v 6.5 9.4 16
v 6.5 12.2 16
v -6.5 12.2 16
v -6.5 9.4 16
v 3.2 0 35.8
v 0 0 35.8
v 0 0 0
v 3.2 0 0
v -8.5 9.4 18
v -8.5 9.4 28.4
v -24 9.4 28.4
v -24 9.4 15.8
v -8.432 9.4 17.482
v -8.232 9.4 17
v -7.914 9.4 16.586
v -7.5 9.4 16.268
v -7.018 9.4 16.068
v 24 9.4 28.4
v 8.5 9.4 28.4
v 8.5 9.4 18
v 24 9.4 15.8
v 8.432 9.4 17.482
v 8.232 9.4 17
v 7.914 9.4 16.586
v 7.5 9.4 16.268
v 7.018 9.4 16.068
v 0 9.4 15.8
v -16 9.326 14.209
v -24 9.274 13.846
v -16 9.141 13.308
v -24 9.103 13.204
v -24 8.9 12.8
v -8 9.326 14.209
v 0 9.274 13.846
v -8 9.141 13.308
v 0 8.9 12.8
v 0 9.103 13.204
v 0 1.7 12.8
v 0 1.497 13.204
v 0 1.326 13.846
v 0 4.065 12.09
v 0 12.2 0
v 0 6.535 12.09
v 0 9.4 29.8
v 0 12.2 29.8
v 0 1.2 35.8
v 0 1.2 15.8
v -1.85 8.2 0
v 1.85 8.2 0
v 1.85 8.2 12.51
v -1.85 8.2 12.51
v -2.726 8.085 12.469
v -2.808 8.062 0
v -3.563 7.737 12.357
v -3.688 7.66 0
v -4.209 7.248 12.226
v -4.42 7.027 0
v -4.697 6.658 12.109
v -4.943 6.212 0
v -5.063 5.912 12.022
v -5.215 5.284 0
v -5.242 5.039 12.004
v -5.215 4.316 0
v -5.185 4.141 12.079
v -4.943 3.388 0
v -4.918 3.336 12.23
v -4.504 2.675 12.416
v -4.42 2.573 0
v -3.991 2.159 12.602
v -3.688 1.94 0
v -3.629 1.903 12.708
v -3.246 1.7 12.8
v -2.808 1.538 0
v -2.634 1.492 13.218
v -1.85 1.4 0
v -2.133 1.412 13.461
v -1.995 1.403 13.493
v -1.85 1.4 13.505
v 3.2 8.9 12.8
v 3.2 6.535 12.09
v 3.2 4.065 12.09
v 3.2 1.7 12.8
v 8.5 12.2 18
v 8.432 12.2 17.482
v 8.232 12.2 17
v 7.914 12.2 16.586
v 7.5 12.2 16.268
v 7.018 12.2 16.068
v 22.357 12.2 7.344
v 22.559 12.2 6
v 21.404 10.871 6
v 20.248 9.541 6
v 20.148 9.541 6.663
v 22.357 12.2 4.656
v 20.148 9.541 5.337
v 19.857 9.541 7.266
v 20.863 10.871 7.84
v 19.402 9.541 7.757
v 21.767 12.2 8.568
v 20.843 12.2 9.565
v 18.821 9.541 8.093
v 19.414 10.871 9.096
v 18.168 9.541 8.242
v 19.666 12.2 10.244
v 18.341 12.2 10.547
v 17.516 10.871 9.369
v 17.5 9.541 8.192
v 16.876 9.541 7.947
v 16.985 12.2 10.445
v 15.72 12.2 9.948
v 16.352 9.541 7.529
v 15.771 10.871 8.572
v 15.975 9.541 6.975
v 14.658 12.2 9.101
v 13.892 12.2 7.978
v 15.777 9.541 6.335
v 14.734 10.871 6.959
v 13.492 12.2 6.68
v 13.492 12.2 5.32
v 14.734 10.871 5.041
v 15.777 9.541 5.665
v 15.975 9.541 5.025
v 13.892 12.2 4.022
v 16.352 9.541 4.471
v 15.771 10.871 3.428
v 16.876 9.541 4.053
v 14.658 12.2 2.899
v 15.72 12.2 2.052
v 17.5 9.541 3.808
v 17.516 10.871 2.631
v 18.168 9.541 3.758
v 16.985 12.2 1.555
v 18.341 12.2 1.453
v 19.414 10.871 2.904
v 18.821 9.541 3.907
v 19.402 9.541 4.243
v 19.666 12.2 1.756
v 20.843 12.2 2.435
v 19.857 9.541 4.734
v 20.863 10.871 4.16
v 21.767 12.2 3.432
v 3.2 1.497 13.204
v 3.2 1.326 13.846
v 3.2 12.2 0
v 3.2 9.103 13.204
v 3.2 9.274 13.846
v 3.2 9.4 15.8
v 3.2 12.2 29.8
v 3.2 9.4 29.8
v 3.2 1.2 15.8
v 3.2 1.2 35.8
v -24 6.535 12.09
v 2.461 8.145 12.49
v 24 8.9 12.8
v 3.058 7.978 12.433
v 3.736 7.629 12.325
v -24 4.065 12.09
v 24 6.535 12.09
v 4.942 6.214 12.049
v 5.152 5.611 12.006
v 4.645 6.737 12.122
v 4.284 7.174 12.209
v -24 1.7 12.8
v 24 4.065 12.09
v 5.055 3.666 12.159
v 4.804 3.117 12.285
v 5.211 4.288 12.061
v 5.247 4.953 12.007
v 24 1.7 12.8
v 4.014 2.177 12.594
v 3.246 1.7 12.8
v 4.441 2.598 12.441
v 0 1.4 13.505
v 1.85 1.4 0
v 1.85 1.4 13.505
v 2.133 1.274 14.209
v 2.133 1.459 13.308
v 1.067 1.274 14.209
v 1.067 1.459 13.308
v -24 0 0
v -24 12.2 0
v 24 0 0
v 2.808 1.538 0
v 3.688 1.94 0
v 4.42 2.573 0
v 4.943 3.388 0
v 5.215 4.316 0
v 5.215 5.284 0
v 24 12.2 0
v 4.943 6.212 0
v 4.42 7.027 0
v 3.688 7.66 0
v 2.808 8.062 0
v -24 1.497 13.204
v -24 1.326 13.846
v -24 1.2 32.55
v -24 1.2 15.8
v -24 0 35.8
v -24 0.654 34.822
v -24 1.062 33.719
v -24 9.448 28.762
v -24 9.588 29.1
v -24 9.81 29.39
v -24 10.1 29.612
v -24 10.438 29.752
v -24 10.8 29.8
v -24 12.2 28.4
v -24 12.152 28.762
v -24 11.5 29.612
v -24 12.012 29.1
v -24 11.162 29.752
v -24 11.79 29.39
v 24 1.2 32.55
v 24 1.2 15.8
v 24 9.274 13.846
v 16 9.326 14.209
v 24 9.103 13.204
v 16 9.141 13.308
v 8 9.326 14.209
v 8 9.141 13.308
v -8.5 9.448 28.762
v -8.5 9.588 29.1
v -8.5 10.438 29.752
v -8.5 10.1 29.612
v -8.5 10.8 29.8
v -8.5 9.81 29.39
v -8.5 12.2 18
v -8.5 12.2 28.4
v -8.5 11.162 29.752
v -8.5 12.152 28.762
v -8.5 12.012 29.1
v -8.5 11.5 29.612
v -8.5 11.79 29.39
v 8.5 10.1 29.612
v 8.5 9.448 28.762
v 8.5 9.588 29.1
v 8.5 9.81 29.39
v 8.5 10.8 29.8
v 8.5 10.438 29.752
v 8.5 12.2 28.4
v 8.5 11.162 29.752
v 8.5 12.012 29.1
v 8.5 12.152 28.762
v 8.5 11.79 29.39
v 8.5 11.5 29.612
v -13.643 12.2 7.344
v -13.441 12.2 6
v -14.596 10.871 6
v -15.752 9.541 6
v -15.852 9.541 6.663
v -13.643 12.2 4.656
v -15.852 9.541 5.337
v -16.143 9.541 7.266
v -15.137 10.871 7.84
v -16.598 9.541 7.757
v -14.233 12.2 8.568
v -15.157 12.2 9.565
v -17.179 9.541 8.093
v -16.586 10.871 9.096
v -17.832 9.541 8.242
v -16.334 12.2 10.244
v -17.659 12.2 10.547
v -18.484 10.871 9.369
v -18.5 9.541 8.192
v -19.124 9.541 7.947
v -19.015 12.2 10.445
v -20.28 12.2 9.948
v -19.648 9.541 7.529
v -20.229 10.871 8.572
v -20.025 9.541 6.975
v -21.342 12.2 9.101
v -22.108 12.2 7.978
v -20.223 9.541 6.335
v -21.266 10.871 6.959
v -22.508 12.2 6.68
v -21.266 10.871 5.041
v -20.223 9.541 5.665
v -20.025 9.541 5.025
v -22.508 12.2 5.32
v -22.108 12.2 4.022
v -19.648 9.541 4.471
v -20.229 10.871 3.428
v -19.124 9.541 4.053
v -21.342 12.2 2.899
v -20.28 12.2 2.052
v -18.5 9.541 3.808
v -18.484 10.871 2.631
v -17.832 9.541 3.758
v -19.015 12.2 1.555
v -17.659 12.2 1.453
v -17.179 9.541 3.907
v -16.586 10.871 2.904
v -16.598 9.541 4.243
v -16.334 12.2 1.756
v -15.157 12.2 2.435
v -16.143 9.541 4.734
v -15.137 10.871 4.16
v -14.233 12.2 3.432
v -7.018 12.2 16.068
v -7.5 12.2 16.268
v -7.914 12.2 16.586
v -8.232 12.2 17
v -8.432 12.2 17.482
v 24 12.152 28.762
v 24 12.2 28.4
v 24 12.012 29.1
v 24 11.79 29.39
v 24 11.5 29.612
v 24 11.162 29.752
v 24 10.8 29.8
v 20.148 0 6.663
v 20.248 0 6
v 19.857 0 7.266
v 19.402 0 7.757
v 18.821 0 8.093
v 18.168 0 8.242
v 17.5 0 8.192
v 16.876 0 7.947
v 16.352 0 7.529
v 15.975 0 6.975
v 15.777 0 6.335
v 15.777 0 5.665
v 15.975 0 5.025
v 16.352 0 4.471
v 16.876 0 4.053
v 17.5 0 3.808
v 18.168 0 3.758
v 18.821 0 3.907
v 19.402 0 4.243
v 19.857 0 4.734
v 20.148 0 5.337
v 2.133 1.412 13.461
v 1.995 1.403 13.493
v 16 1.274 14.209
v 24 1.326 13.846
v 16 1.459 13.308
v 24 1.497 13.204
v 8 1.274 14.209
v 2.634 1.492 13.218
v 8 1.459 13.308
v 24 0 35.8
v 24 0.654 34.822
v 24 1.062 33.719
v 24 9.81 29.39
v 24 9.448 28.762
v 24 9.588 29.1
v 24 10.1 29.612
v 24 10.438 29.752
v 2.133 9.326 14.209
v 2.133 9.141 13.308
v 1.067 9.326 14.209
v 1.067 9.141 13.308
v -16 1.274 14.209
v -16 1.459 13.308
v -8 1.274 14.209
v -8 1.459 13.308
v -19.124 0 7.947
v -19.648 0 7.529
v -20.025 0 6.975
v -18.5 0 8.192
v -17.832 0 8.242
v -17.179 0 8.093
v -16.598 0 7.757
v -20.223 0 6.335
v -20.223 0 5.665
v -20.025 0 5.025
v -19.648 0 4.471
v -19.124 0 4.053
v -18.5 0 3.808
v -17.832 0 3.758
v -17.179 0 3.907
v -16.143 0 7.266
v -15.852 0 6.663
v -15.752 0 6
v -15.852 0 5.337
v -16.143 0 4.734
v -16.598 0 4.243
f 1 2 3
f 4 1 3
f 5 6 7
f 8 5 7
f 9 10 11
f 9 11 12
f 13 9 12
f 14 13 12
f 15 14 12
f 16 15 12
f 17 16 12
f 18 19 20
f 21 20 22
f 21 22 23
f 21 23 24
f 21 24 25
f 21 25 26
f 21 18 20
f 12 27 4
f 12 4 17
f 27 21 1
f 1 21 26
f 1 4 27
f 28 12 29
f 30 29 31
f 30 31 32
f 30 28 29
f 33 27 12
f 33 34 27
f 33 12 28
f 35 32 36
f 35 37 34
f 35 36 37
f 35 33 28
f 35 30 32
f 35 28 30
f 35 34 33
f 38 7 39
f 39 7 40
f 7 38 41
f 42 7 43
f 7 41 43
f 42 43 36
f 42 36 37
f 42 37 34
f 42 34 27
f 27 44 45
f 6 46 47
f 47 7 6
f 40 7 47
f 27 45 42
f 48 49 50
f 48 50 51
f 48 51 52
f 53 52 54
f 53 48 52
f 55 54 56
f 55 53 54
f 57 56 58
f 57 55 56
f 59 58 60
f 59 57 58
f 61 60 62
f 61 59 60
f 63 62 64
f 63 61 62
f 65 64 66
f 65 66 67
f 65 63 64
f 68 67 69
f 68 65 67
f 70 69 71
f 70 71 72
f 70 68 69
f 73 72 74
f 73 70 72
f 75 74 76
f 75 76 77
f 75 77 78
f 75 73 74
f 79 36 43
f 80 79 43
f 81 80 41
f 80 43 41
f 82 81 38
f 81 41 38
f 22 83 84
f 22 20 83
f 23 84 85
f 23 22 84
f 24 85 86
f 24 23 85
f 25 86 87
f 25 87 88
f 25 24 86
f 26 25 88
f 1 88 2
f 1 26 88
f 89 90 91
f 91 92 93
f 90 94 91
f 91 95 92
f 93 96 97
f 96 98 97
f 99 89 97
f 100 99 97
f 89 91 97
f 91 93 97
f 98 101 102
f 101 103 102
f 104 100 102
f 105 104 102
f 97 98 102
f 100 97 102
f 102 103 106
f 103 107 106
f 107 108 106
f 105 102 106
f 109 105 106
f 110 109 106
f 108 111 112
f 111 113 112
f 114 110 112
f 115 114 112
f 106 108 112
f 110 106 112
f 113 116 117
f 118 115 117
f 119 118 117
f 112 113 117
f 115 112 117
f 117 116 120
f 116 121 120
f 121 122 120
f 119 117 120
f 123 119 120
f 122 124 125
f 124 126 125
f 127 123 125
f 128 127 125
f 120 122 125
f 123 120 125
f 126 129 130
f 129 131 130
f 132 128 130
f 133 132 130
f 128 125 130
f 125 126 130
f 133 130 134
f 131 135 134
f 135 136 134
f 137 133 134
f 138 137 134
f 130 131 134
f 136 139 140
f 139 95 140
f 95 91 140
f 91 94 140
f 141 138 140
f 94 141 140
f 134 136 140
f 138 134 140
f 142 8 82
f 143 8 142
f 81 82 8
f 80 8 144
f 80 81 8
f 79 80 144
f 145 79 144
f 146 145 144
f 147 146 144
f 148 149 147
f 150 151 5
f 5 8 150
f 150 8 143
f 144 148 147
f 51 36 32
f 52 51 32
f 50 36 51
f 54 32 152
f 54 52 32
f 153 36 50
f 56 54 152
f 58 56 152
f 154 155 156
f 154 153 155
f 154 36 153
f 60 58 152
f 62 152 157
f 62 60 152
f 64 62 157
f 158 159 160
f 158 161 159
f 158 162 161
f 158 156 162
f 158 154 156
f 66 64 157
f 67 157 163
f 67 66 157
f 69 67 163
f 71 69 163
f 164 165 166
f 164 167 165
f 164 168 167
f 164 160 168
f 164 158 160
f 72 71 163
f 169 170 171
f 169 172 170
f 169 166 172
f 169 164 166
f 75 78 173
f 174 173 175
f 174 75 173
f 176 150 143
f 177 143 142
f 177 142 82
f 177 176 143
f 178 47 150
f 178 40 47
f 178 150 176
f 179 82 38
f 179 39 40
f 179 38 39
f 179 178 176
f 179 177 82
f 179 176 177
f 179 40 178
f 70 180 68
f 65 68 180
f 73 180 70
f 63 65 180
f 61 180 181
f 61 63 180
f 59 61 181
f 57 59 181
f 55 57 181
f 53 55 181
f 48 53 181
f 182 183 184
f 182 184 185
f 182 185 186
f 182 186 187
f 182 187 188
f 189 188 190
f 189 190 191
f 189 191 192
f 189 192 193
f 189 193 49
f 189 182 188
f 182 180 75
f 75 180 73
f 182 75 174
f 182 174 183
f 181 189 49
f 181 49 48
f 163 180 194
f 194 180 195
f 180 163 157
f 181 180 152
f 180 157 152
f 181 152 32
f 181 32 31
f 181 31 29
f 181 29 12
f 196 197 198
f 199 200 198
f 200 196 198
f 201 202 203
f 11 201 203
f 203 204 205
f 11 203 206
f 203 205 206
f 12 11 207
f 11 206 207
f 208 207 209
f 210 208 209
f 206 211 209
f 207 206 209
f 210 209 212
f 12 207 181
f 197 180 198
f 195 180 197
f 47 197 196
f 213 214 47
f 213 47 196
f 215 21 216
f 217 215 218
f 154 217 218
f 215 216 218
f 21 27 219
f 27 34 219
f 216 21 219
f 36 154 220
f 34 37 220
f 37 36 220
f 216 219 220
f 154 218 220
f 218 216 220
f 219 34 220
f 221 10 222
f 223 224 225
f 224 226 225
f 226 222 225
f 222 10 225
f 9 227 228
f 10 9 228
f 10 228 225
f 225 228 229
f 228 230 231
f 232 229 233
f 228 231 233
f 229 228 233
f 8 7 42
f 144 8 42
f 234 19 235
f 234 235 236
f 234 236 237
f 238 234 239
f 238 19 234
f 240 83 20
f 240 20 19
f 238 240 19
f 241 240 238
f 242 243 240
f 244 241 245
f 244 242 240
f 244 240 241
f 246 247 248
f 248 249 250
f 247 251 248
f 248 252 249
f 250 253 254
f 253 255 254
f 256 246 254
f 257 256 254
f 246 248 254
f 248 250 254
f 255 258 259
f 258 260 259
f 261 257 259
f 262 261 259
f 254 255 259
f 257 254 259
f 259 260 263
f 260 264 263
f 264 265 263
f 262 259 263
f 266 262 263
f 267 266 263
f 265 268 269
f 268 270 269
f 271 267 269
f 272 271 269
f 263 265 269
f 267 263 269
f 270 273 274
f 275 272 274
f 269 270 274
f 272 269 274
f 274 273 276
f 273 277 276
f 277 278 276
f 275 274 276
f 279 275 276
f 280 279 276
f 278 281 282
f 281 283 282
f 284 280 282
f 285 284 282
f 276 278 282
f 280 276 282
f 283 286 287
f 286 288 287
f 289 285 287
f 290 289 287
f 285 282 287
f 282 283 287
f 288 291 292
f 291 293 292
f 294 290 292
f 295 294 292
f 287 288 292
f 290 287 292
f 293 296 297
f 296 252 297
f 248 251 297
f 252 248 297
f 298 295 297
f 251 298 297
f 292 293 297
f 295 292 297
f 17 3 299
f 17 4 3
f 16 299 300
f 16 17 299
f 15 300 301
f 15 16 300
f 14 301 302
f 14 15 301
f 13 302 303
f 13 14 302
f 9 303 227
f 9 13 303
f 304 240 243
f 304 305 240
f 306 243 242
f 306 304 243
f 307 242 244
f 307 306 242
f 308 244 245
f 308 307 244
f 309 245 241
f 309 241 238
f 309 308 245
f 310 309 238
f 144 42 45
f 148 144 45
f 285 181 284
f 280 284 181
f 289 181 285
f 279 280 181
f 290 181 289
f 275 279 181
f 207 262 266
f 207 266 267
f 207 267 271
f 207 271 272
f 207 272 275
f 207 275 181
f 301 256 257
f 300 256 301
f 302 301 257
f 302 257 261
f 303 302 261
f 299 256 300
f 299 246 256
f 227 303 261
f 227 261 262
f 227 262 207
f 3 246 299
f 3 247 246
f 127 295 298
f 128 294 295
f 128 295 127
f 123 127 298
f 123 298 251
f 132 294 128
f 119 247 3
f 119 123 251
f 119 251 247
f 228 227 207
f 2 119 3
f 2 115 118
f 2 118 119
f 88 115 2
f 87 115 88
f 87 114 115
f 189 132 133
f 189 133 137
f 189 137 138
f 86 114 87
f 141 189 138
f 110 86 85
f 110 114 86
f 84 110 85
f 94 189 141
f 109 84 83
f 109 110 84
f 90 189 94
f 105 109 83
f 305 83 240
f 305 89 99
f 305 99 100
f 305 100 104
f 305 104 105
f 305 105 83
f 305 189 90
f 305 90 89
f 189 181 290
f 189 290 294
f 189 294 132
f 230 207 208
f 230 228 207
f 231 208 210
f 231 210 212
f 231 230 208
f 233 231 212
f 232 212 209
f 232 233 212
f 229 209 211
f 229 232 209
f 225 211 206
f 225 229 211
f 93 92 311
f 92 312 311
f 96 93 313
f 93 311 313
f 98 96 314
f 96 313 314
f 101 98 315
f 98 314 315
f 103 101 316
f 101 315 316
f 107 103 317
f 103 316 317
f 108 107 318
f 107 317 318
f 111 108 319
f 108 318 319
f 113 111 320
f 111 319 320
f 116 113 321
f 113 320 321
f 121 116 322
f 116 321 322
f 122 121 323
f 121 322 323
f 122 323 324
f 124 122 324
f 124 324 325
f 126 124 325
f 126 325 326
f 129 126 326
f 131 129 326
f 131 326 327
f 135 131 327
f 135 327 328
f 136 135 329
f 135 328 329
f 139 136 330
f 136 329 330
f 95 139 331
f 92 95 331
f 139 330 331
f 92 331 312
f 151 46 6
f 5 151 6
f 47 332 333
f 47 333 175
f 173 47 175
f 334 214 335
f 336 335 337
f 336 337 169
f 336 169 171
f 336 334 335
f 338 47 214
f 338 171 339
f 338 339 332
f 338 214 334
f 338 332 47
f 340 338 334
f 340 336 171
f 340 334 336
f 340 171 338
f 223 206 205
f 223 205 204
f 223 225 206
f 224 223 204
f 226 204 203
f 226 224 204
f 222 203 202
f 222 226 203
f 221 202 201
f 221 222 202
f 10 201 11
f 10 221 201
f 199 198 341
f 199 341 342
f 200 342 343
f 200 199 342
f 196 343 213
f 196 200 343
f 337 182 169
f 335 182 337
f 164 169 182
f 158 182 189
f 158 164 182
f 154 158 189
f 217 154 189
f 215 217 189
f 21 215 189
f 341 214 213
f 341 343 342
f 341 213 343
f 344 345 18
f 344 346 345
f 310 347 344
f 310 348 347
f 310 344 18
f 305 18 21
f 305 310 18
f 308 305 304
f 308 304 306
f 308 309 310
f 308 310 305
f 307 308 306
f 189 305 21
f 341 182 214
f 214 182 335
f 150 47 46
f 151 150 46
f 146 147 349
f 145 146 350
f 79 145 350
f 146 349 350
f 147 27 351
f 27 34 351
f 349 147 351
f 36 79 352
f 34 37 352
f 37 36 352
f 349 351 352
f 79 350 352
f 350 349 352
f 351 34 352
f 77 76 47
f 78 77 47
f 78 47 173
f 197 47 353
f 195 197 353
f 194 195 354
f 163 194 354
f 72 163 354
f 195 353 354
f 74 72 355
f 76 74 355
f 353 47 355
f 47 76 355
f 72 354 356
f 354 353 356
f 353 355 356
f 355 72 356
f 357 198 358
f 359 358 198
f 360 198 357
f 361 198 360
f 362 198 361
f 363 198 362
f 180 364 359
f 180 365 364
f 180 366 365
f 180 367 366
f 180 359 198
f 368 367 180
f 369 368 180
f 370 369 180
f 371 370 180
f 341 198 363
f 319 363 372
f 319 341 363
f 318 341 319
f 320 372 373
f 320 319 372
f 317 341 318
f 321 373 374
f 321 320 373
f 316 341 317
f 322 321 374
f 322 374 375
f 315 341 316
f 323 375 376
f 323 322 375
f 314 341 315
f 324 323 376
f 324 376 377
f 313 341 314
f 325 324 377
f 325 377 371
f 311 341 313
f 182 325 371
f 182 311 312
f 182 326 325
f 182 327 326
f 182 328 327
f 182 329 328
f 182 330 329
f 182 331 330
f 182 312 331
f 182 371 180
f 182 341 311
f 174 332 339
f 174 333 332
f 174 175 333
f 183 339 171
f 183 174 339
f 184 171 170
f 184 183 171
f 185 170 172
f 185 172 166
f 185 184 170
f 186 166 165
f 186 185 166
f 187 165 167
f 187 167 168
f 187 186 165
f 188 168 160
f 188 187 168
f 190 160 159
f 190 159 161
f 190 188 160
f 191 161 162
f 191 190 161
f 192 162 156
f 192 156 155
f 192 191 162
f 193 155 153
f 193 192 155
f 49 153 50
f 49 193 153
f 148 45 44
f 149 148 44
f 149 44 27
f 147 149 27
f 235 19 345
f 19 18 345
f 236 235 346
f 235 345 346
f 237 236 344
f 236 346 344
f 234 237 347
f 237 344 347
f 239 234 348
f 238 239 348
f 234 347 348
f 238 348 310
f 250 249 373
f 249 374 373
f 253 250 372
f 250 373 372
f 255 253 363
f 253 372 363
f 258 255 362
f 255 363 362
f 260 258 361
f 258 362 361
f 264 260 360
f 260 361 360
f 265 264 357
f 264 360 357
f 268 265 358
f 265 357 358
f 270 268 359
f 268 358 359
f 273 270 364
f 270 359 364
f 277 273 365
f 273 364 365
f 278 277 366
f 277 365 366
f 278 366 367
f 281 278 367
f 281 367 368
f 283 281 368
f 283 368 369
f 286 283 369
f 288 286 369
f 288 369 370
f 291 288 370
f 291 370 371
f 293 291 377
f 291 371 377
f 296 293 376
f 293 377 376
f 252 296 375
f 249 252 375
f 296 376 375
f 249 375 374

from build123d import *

# Parameters (mm, degrees)
F1_DEPTH        = 3.2
F2_DEPTH        = 24
F4_DEPTH        = 35.8010001
F5_W            = 17
F5_H            = 13.8
F6_DEPTH        = 2.8
F7_R            = 1.39999
F8_T1_DEPTH     = 64.2480768093
F9_R            = 2
F10_D           = 4.4958
F10_CSINK_D     = 9.1186
F10_CSINK_ANGLE = 82


# Not quite as in the source:
# - a fillet or chamfer that OpenCascade refuses, or shapes differently, is made with other operations: its cross-section is extruded or revolved along the edge and cut away or added
# - a fillet or chamfer is up to 0.001 mm smaller than in the source, because OpenCascade refuses the exact size


with BuildPart() as f1:
    # F0 (on Right) → F1 (new body)
    with BuildSketch(Plane.YZ):
        with BuildLine():
            Line((1.2, 15.8), (1.2, 35.8))
            Line((1.2, 35.8), (0, 35.8))
            Line((0, 35.8), (0, 0))
            Line((0, 0), (12.2, 0))
            Line((12.2, 0), (12.2, 29.8))
            Line((12.2, 29.8), (9.4, 29.8))
            Line((9.4, 29.8), (9.4, 15.8))
            add(Edge.make_bspline(
                [(9.4, 15.8), (9.4, 13.7632392675), (9.1505151562, 13.2120574221), (8.9, 12.8)],
                knots=[0, 0, 0, 0, 3.0413812651, 3.0413812651, 3.0413812651, 3.0413812651], degree=3))
            ThreePointArc((8.9, 12.8), (5.3, 12), (1.7, 12.8))
            add(Edge.make_bspline(
                [(1.2, 15.8), (1.2, 13.7632392675), (1.4494848438, 13.2120574221), (1.7, 12.8)],
                knots=[0, 0, 0, 0, 3.0413812651, 3.0413812651, 3.0413812651, 3.0413812651], degree=3))
        make_face()
    extrude(amount=F1_DEPTH)


with BuildPart() as f2:
    # F0 (on Right) → F2 (new body, symmetric)
    with BuildSketch(Plane.YZ):
        with BuildLine():
            Line((1.2, 15.8), (1.2, 35.8))
            Line((1.2, 35.8), (0, 35.8))
            Line((0, 35.8), (0, 0))
            Line((0, 0), (12.2, 0))
            Line((12.2, 0), (12.2, 29.8))
            Line((12.2, 29.8), (9.4, 29.8))
            Line((9.4, 29.8), (9.4, 15.8))
            add(Edge.make_bspline(
                [(9.4, 15.8), (9.4, 13.7632392675), (9.1505151562, 13.2120574221), (8.9, 12.8)],
                knots=[0, 0, 0, 0, 3.0413812651, 3.0413812651, 3.0413812651, 3.0413812651], degree=3))
            ThreePointArc((8.9, 12.8), (5.3, 12), (1.7, 12.8))
            add(Edge.make_bspline(
                [(1.2, 15.8), (1.2, 13.7632392675), (1.4494848438, 13.2120574221), (1.7, 12.8)],
                knots=[0, 0, 0, 0, 3.0413812651, 3.0413812651, 3.0413812651, 3.0413812651], degree=3))
        make_face()
    extrude(amount=F2_DEPTH, both=True)

    # F3 (on Top) → F4 (cut, through all)
    with BuildSketch(Plane.XY):
        with BuildLine():
            Line((1.85, 8.2), (-1.85, 8.2))
            ThreePointArc((-1.85, 8.2), (-5.25, 4.8), (-1.85, 1.4))
            Line((-1.85, 1.4), (1.85, 1.4))
            ThreePointArc((1.85, 1.4), (5.25, 4.8), (1.85, 8.2))
        make_face()
    extrude(amount=F4_DEPTH, mode=Mode.SUBTRACT)

    # F5 (on face) → F6 (cut, through all)
    with BuildSketch(Plane(origin=(0, 12.2, 0), x_dir=(-1, 0, 0), z_dir=(0, 1, 0))):
        with Locations((0, 22.9)):
            Rectangle(F5_W, F5_H)
    extrude(amount=-F6_DEPTH, mode=Mode.SUBTRACT)

    # F7 (radius 1.4 in the source; OpenCascade refuses exactly that, so slightly less here)
    f7_edges = [f2.edges().sort_by_distance(p)[0] for p in [
        (16.25, 12.2, 29.8),
        (-16.25, 12.2, 29.8),
        (-16.25, 9.4, 29.8),
        (16.25, 9.4, 29.8),
    ]]
    fillet(f7_edges, radius=F7_R)

    # F8: fillet of radius 5 on 1 edges, made by hand

    # F8_s2 → F8_t1 (cut)
    with BuildSketch(Plane.YZ.offset(-32.1240384046)):
        with BuildLine():
            ThreePointArc((0, 35.8), (0.8904157598, 34.2824354457), (1.2, 32.5503846381))
            Line((1.2, 32.5503846381), (1.2, 35.8))
            Line((1.2, 35.8), (0, 35.8))
        make_face()
    extrude(amount=F8_T1_DEPTH, mode=Mode.SUBTRACT)

    # F9
    f9_edges = [f2.edges().sort_by_distance(p)[0] for p in [
        (8.5, 10.8, 16),
        (-8.5, 10.8, 16),
    ]]
    fillet(f9_edges, radius=F9_R)

    # F10 (through all)
    with Locations(Plane(origin=(0, 12.2, 0), x_dir=(-1, 0, 0), z_dir=(0, 1, 0))):
        with Locations((-18, 6), (18, 6)):
            CounterSinkHole(F10_D / 2, F10_CSINK_D / 2, counter_sink_angle=F10_CSINK_ANGLE)


solid = Compound([f1.part, f2.part])
